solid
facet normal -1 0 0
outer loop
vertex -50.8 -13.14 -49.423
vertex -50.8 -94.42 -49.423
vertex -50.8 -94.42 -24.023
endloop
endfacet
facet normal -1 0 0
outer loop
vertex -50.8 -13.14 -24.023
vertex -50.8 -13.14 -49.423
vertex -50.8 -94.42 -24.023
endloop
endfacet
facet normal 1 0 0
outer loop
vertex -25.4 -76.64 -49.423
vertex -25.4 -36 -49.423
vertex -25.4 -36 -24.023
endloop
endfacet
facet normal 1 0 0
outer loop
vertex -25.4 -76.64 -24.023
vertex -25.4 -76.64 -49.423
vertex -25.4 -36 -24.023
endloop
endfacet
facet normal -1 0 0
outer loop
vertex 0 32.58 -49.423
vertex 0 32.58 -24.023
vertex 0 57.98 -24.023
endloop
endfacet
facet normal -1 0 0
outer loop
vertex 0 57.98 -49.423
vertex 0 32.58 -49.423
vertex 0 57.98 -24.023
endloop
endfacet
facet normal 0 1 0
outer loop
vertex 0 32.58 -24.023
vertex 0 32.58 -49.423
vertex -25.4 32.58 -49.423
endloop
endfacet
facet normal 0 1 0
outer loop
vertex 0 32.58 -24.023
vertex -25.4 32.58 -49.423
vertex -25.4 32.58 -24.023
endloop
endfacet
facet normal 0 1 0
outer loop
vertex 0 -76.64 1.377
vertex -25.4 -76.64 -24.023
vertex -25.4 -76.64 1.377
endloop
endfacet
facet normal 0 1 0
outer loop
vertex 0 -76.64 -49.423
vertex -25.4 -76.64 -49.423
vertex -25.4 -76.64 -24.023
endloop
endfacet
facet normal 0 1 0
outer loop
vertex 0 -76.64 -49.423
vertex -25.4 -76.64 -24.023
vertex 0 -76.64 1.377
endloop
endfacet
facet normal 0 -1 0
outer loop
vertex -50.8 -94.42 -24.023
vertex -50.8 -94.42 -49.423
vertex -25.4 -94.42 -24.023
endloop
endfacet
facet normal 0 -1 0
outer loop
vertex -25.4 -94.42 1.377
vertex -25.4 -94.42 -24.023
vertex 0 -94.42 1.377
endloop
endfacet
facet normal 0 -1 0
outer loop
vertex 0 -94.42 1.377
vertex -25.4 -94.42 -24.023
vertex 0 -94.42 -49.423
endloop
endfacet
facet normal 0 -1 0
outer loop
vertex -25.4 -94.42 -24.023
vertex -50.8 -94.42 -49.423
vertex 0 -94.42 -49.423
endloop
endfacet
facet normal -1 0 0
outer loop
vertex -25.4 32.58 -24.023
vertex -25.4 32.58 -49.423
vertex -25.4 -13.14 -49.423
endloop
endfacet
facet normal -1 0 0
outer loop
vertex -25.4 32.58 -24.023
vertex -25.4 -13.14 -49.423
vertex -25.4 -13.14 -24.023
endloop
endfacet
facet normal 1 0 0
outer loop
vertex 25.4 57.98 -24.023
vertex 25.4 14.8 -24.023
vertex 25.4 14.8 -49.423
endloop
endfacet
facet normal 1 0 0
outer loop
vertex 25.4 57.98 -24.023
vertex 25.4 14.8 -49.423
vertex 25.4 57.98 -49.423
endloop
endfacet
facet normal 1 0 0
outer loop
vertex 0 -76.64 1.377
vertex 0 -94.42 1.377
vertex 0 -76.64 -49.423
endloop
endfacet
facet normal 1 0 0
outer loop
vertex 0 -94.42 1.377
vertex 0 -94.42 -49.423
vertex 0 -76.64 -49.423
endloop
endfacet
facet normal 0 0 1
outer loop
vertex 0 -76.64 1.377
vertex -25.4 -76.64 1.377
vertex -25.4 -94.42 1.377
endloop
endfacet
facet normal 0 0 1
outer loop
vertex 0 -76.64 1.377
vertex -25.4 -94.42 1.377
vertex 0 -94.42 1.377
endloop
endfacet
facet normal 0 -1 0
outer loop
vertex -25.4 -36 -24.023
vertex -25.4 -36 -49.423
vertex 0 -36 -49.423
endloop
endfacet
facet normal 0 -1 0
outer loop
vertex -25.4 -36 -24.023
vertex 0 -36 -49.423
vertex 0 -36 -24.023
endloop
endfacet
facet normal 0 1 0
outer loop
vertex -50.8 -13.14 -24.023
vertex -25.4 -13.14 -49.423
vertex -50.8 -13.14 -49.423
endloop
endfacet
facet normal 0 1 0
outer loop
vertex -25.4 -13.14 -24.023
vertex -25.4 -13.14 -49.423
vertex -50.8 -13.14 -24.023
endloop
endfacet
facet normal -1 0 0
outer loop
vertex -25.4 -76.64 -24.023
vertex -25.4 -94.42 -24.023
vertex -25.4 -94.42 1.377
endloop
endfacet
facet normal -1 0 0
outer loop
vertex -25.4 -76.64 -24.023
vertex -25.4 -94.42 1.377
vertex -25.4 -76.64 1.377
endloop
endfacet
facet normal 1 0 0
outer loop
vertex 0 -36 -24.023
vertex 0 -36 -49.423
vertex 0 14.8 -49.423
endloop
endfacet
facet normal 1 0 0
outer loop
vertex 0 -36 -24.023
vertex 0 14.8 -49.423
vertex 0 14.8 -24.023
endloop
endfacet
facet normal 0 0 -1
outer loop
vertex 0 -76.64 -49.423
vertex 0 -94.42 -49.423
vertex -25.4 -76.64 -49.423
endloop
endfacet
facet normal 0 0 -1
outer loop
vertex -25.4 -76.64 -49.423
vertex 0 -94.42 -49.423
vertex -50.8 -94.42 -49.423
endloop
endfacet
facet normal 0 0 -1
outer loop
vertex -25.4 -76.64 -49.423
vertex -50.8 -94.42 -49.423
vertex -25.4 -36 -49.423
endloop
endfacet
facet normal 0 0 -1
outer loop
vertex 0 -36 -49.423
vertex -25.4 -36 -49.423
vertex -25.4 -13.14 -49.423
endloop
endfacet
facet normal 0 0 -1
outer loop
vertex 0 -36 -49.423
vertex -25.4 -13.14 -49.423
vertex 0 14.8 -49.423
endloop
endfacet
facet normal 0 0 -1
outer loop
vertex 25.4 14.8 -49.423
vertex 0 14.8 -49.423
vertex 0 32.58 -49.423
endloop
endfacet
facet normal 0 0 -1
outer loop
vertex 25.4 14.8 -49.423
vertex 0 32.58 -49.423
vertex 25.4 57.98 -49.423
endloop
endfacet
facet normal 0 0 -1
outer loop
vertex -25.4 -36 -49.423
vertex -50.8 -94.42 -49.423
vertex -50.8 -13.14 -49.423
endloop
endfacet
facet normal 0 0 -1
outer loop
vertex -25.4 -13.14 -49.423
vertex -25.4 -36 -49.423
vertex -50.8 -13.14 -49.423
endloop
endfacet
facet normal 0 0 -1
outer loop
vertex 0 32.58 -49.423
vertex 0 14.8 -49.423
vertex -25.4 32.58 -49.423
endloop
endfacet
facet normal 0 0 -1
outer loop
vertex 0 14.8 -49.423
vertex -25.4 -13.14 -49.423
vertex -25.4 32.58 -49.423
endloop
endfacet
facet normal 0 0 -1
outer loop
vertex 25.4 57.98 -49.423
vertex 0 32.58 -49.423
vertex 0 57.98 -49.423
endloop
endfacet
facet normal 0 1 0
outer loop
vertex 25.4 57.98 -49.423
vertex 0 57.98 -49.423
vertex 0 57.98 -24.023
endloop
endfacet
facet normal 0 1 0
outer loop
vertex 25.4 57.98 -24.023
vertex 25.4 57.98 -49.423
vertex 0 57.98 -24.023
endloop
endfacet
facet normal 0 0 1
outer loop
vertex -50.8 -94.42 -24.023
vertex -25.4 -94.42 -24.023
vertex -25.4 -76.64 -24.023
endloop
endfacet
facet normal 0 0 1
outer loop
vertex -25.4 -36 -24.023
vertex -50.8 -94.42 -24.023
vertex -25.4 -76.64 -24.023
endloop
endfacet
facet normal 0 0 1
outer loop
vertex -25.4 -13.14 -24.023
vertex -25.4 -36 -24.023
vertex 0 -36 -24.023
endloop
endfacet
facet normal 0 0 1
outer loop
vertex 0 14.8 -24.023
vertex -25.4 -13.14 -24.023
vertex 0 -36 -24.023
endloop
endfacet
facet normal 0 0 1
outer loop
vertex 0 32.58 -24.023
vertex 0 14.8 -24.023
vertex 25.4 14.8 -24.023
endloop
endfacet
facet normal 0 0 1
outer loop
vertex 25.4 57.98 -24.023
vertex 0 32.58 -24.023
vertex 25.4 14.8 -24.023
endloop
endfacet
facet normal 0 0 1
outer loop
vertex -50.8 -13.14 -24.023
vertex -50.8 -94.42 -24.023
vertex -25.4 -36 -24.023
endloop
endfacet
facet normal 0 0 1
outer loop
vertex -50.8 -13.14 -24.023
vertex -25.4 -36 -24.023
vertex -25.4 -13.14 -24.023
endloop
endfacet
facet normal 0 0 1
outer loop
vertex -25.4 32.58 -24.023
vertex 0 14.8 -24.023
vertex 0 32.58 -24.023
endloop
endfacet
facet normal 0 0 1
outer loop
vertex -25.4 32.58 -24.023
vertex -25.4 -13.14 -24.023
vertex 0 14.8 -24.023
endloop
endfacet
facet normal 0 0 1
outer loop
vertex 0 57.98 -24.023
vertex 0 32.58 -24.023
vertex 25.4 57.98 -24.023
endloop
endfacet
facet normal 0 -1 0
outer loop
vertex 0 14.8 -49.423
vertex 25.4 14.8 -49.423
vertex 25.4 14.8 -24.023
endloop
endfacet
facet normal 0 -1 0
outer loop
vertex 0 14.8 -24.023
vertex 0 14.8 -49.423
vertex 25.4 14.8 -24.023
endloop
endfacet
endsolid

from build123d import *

# Parameters (mm, degrees)
F0_W      = 43.18
F0_H      = 25.4
F1_DEPTH  = 25.4
F2_W      = 17.78
F2_H      = 25.4
F3_DEPTH  = 25.4
F4_W      = 25.4
F4_H      = 25.4
F5_DEPTH  = 50.8
F6_W      = 22.86
F6_H      = 25.4
F7_DEPTH  = 25.4
F8_W      = 25.4
F8_H      = 25.4
F9_DEPTH  = 58.42
F10_W     = 17.78
F10_H     = 25.4
F11_DEPTH = 25.4
F12_W     = 25.4
F12_H     = 17.78
F13_DEPTH = 25.4


with BuildPart() as f1:
    # F0 (on Right) → F1 (new body)
    with BuildSketch(Plane.YZ):
        with Locations((36.3900898956, -36.7231099647)):
            Rectangle(F0_W, F0_H)
    extrude(amount=F1_DEPTH)

    # F2 (on face) → F3 (join)
    with BuildSketch(Plane(origin=(0, 0, 0), x_dir=(0, -1, 0), z_dir=(-1, 0, 0))):
        with Locations((-23.6900898956, -36.7231099647)):
            Rectangle(F2_W, F2_H)
    extrude(amount=F3_DEPTH)

    # F4 (on face) → F5 (join)
    with BuildSketch(Plane.XZ.offset(-14.8000898956)):
        with Locations((-12.7, -36.7231099647)):
            Rectangle(F4_W, F4_H)
    extrude(amount=F5_DEPTH)

    # F6 (on face) → F7 (join)
    with BuildSketch(Plane(origin=(-25.4, 0, 0), x_dir=(0, -1, 0), z_dir=(-1, 0, 0))):
        with Locations((24.5699101044, -36.7231099647)):
            Rectangle(F6_W, F6_H)
    extrude(amount=F7_DEPTH)

    # F8 (on face) → F9 (join)
    with BuildSketch(Plane.XZ.offset(35.9999101044)):
        with Locations((-38.1, -36.7231099647)):
            Rectangle(F8_W, F8_H)
    extrude(amount=F9_DEPTH)

    # F10 (on face) → F11 (join)
    with BuildSketch(Plane.YZ.offset(-25.4)):
        with Locations((-85.5299101044, -36.7231099647)):
            Rectangle(F10_W, F10_H)
    extrude(amount=F11_DEPTH)

    # F12 (on face) → F13 (join)
    with BuildSketch(Plane.XY.offset(-24.0231099647)):
        with Locations((-12.7, -85.5299101044)):
            Rectangle(F12_W, F12_H)
    extrude(amount=F13_DEPTH)


solid = f1.part
